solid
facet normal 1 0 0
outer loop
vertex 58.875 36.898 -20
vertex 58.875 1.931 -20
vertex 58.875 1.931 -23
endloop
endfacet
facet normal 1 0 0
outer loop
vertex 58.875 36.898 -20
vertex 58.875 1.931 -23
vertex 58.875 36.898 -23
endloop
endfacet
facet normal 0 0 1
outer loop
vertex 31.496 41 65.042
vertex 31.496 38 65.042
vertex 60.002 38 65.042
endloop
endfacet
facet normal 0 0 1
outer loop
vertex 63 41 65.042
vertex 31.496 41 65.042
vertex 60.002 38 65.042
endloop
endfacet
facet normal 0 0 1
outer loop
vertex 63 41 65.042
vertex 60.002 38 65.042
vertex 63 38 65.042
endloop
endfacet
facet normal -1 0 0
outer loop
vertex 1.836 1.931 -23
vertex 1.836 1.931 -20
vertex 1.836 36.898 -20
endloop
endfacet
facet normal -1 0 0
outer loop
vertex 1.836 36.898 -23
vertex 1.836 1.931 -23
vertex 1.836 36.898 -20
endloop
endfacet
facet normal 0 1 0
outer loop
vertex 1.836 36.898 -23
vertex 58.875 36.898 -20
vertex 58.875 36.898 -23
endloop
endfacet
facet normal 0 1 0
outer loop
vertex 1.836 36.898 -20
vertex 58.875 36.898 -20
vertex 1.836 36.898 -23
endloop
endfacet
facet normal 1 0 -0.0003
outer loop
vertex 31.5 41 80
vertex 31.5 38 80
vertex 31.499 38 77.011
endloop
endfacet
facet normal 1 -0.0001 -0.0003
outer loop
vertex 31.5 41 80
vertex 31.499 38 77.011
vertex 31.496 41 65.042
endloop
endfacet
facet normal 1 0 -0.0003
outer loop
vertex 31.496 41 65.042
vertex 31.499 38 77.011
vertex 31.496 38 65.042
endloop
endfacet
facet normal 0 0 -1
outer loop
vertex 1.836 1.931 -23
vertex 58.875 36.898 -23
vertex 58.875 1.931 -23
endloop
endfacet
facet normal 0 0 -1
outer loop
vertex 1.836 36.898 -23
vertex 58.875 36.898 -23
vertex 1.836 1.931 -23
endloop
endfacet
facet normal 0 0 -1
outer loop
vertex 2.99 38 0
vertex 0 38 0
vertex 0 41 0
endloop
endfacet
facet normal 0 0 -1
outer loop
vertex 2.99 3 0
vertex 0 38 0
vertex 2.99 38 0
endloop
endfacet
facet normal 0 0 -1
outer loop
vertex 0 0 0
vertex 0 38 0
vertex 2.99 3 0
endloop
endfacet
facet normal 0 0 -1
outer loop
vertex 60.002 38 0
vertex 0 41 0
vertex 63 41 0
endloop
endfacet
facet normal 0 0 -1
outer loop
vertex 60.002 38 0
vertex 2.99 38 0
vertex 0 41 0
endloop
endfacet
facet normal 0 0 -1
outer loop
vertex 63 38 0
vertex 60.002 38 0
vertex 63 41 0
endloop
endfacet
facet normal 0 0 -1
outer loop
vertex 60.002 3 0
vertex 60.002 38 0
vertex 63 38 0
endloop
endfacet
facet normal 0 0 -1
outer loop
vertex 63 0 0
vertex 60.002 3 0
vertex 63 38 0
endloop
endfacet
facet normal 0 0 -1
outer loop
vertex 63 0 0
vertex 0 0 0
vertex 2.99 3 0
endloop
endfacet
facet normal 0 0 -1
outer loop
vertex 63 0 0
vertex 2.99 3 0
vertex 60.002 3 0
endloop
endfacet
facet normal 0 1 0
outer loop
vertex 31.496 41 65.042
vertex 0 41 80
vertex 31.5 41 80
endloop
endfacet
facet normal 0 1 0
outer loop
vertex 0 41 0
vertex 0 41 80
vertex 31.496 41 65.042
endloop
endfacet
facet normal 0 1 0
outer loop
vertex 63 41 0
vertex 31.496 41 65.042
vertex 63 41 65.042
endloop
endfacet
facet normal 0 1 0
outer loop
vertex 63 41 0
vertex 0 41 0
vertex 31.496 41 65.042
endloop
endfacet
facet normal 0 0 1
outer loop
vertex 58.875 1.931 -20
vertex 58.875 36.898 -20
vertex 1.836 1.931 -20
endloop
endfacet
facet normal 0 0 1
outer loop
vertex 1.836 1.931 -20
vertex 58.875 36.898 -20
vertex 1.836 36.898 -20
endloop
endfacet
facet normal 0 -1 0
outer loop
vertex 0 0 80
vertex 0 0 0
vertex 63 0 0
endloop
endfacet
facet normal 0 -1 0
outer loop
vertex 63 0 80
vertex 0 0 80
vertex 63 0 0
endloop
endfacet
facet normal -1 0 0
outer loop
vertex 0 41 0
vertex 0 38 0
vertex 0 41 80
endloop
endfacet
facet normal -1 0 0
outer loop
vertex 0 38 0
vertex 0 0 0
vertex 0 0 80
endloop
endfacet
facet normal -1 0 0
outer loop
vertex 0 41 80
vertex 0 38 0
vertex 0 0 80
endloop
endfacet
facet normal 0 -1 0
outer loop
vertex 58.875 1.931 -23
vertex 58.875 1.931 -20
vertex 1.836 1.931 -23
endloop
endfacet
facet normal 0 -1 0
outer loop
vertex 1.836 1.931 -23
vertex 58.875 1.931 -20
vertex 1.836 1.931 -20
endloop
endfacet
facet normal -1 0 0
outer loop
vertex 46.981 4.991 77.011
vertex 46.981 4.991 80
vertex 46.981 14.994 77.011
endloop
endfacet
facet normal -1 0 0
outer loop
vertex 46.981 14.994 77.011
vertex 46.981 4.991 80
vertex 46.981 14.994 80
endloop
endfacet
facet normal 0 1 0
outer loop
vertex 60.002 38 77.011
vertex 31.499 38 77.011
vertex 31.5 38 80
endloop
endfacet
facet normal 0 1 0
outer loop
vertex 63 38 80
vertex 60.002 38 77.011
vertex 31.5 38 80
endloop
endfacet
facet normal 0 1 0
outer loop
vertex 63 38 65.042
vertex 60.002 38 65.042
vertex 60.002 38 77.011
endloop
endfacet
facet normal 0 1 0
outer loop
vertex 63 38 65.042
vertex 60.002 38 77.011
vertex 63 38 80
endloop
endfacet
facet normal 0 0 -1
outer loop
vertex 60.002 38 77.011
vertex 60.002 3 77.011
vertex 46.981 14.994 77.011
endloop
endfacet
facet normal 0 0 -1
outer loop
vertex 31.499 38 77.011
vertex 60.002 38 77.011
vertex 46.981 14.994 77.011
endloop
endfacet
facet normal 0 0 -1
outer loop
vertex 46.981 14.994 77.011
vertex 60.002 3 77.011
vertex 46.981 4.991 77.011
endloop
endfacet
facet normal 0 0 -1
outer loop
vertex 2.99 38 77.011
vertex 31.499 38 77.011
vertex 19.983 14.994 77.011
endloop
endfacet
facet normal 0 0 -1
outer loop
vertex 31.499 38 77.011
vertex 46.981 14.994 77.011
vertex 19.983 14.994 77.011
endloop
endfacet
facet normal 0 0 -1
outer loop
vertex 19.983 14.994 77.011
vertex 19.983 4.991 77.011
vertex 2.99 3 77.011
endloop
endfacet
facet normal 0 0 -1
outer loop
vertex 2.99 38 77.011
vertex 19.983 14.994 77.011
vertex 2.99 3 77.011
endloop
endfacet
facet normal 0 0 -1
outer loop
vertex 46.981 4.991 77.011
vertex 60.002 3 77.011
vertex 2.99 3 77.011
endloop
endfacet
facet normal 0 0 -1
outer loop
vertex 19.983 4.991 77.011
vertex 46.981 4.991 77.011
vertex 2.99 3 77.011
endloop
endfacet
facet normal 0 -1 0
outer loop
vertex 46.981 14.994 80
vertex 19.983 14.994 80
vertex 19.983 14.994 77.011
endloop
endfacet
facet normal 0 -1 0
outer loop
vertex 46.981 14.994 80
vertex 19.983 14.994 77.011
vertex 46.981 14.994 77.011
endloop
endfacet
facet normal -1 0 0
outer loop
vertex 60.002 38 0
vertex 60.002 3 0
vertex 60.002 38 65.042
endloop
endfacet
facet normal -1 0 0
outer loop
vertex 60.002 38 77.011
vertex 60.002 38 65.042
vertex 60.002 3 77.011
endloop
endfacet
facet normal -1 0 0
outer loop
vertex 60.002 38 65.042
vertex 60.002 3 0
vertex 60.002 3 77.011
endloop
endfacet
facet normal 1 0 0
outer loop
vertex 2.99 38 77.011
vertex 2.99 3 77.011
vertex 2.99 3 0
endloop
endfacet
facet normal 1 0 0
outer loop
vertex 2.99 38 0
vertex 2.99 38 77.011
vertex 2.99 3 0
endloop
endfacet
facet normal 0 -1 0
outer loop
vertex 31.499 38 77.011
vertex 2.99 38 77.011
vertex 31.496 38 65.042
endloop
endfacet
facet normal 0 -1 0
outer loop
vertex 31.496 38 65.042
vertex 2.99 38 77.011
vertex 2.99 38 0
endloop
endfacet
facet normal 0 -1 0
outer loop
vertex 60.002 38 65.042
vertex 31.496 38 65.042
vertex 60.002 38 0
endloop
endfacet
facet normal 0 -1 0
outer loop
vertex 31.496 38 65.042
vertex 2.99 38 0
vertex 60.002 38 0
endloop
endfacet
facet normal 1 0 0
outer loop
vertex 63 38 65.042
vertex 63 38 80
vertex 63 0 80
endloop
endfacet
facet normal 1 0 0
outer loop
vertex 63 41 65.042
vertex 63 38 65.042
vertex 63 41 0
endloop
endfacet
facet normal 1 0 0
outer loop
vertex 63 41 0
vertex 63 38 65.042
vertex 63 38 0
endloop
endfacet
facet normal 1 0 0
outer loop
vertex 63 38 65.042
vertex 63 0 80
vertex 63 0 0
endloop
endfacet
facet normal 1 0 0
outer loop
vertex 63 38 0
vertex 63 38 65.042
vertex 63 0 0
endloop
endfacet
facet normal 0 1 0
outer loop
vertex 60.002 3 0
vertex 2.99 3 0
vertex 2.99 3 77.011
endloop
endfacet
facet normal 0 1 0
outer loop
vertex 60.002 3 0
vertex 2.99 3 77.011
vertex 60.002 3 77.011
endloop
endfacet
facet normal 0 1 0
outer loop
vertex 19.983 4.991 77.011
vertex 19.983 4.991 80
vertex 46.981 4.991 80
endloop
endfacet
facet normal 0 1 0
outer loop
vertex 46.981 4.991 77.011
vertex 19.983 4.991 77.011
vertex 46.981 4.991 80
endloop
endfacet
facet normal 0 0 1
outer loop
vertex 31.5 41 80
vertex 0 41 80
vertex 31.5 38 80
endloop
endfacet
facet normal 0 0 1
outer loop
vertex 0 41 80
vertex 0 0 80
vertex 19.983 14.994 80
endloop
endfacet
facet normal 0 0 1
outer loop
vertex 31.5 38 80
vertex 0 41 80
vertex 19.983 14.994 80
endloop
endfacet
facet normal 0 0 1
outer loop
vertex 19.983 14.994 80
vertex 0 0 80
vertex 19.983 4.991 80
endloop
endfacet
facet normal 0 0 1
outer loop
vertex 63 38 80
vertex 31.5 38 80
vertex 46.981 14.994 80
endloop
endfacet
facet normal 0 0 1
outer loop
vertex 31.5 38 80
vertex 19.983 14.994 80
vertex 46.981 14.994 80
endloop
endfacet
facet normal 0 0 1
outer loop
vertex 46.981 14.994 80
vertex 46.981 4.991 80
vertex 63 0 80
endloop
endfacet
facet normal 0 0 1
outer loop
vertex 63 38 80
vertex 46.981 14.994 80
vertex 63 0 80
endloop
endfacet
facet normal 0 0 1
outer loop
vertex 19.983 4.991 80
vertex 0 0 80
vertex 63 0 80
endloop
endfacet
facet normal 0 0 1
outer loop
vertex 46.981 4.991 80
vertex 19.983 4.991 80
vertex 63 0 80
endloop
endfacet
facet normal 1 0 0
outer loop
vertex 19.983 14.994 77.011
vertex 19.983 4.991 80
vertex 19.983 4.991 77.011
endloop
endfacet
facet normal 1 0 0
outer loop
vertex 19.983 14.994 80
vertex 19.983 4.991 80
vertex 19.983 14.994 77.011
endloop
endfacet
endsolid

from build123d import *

# Parameters (mm, degrees)
ESBO_O2_W                = 63
ESBO_O2_H                = 80
RESSALTO_EXTRUS_O1_DEPTH = 3
RESSALTO_EXTRUS_O2_DEPTH = 35
ESBO_O4_W                = 63
ESBO_O4_H                = 65.041847247
RESSALTO_EXTRUS_O3_DEPTH = 3
ESBO_O6_W                = 57.038627548
ESBO_O6_H                = 34.967547607
RESSALTO_EXTRUS_O4_DEPTH = 3
RESSALTO_EXTRUS_O5_DEPTH = 3
ESBO_O8_W                = 26.997691041
ESBO_O8_H                = 10.002963711
CORTE_EXTRUS_O1_DEPTH    = 3


with BuildPart() as part:
    # Esboço2 → Ressalto-extrusão1 (new body)
    with BuildSketch(Plane(origin=(0, 0, 0), x_dir=(1, 0, 0), z_dir=(0, 1, 0))):
        with Locations((31.5, -40)):
            Rectangle(ESBO_O2_W, ESBO_O2_H)
    extrude(amount=RESSALTO_EXTRUS_O1_DEPTH)

    # Esboço3 → Ressalto-extrusão2 (add)
    with BuildSketch(Plane(origin=(0, 3, 0), x_dir=(1, 0, 0), z_dir=(0, 1, 0))):
        Polygon((63, -80), (63, 0), (60.001706293, 0), (60.001706293, -77.010558462), (2.99035903, -77.010558462), (2.99035903, 0), (0, 0), (0, -80), align=None)
    extrude(amount=RESSALTO_EXTRUS_O2_DEPTH)

    # Esboço4 → Ressalto-extrusão3 (add)
    with BuildSketch(Plane(origin=(0, 38, 0), x_dir=(1, 0, 0), z_dir=(0, 1, 0))):
        with Locations((31.5, -32.520923624)):
            Rectangle(ESBO_O4_W, ESBO_O4_H)
    extrude(amount=RESSALTO_EXTRUS_O3_DEPTH)

    # Esboço7 → Ressalto-extrusão5 (add)
    with BuildSketch(Plane(origin=(0, 38, 0), x_dir=(1, 0, 0), z_dir=(0, 1, 0))):
        Polygon((0, -65.041847247), (0, -80), (31.5, -80), (31.496032662, -65.041847247), align=None)
    extrude(amount=RESSALTO_EXTRUS_O5_DEPTH)

    # Esboço8 → Corte-extrusão1 (cut)
    with BuildSketch(Plane.XY.offset(80)):
        with Locations((33.481992584, 9.992269492)):
            Rectangle(ESBO_O8_W, ESBO_O8_H)
    extrude(amount=-CORTE_EXTRUS_O1_DEPTH, mode=Mode.SUBTRACT)


with BuildPart() as body_2:
    # Esboço6 → Ressalto-extrusão4 (new body)
    with BuildSketch(Plane(origin=(0, 0, -20), x_dir=(-1, 0, 0), z_dir=(0, 0, -1))):
        with Locations((-30.355722228, 19.414542594)):
            Rectangle(ESBO_O6_W, ESBO_O6_H)
    extrude(amount=RESSALTO_EXTRUS_O4_DEPTH)


solid = Compound([part.part, body_2.part])
